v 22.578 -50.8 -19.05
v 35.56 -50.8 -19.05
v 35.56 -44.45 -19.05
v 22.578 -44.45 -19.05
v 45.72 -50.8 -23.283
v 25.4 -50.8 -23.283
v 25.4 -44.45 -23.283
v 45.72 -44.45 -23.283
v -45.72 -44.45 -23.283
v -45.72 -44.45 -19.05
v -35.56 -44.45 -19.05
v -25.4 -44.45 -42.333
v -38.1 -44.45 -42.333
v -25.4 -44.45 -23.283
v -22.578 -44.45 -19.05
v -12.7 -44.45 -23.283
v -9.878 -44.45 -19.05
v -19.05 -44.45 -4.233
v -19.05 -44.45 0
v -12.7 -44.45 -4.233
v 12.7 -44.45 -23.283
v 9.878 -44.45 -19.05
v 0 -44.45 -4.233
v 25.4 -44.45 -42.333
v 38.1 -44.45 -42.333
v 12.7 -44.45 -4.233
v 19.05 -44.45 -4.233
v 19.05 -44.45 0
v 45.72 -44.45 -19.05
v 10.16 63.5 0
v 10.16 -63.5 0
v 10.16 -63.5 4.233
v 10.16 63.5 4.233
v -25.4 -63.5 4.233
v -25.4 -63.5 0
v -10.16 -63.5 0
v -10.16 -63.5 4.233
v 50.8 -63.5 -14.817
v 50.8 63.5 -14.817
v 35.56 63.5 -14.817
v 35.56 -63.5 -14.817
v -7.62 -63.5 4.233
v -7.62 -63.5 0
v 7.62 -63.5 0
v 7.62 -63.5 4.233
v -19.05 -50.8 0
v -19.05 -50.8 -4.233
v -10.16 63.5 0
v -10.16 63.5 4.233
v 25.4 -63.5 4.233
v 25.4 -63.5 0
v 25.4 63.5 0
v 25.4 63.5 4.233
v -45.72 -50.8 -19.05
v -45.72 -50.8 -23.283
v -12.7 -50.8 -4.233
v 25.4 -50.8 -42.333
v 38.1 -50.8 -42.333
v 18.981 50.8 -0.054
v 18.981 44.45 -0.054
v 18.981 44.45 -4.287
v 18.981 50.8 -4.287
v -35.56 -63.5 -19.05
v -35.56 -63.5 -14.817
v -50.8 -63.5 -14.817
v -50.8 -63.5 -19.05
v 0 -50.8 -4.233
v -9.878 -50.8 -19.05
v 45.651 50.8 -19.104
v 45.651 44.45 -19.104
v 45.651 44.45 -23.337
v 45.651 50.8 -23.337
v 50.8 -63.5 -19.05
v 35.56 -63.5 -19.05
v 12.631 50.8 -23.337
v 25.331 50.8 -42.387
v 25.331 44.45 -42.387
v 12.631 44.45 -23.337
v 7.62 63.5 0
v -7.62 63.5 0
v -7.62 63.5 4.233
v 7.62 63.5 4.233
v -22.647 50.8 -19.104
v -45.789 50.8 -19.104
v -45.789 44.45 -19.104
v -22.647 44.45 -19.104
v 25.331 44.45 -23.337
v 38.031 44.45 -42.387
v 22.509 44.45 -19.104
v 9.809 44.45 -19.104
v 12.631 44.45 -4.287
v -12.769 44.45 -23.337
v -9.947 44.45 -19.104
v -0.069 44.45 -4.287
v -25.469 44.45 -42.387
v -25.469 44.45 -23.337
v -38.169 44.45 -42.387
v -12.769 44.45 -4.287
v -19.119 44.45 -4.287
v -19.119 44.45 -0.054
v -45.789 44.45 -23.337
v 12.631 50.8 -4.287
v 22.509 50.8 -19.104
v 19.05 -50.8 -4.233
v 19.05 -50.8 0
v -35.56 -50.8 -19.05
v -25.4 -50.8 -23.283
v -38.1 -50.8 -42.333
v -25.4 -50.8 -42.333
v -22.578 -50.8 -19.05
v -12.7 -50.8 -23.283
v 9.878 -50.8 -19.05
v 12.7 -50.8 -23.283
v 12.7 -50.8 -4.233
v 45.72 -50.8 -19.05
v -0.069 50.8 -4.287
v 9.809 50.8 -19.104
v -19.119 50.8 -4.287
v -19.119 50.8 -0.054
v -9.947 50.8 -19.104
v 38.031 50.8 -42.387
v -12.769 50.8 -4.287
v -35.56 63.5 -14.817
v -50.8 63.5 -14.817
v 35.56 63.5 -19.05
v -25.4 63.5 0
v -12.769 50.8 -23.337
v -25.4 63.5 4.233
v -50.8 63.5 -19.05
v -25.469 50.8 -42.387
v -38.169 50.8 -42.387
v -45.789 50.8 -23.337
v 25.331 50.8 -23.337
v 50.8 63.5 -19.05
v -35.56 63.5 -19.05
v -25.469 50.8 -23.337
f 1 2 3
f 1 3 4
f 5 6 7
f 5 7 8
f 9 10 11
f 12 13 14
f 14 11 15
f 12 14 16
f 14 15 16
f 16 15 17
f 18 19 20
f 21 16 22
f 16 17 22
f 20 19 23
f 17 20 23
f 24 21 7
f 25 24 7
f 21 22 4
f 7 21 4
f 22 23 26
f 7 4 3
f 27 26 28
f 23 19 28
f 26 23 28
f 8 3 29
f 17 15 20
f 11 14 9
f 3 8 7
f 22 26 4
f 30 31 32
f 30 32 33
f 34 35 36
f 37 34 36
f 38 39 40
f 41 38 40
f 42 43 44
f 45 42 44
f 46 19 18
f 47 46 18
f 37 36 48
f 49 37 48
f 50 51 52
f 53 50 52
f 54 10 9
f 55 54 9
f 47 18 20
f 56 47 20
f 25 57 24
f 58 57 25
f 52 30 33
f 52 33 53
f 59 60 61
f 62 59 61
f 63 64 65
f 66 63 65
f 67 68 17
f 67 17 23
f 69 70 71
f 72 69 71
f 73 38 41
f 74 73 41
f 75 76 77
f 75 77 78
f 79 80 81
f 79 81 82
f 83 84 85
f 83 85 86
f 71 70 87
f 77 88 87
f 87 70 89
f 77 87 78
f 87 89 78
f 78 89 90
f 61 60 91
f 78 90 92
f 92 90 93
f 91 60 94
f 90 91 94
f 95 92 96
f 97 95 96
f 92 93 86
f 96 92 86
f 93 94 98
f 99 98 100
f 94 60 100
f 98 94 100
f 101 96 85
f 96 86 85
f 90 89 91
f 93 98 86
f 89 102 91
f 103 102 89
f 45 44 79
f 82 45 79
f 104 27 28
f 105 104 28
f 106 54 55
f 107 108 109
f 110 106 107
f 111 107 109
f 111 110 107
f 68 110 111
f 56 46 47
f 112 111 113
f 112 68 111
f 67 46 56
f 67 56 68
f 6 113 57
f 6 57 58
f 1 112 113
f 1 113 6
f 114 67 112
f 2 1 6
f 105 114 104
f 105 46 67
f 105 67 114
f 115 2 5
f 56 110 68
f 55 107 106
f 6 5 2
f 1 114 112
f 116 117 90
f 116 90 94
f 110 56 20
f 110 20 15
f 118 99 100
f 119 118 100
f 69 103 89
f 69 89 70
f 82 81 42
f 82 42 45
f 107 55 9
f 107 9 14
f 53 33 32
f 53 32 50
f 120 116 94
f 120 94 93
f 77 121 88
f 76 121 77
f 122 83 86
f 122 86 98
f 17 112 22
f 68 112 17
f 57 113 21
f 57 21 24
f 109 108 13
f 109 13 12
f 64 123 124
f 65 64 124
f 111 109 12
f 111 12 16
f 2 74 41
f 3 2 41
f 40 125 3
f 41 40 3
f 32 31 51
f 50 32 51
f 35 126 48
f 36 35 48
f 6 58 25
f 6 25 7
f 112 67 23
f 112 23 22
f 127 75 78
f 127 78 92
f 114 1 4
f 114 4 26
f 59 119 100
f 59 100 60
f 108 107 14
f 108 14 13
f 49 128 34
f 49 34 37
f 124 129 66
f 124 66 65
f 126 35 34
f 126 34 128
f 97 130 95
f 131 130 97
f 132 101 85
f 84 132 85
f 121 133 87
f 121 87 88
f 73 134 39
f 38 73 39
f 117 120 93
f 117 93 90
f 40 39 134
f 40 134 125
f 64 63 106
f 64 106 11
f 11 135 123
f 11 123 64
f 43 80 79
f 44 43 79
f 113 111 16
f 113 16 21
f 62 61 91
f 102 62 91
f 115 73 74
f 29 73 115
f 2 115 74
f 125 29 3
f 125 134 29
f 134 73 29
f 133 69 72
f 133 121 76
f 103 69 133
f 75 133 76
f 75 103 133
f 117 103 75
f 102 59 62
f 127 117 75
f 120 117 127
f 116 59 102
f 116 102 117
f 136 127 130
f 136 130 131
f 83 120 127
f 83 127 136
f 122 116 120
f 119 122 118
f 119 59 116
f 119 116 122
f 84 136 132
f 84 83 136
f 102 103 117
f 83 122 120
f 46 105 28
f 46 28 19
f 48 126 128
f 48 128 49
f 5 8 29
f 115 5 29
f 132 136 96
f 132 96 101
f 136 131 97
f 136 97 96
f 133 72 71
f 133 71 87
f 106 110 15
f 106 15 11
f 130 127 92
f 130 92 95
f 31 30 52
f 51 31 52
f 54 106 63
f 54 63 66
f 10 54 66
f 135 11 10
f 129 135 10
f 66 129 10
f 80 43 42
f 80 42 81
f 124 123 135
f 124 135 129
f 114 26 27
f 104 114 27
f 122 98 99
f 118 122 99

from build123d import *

# Parameters (mm, degrees)
F0_W      = 15.24
F0_H      = 127
F1_DEPTH  = 4.2333333333
F4_DEPTH  = 6.35
F7_DEPTH  = 6.35
F9_W      = 15.24
F9_H      = 4.2333333333
F10_DEPTH = 127


with BuildPart() as f1:
    # F0 (on Top) → F1 (new body)
    with BuildSketch(Plane.XY):
        with Locations((-17.78, 0)):
            Rectangle(F0_W, F0_H)
    extrude(amount=F1_DEPTH)


with BuildPart() as f1b:
    # F0 (on Top) → F1, piece 2 (new body)
    with BuildSketch(Plane.XY):
        with Locations((17.78, 0)):
            Rectangle(F0_W, F0_H)
    extrude(amount=F1_DEPTH)


with BuildPart() as f1c:
    # F0 (on Top) → F1, piece 3 (new body)
    with BuildSketch(Plane.XY):
        Rectangle(F0_W, F0_H)
    extrude(amount=F1_DEPTH)


with BuildPart() as f4:
    # F3 (on offset) → F4 (new body)
    with BuildSketch(Plane.XZ.offset(50.8)):
        Polygon((19.05, 0), (-19.05, 0), (-19.05, -4.2333333333), (-12.7, -4.2333333333), (-22.5777777778, -19.05), (-45.71999982, -19.05), (-45.71999982, -23.2833333333), (-38.1, -23.2833333333), (-25.4, -23.2833333333), (-38.1, -42.3333333333), (-25.4, -42.3333333333), (-12.7, -23.2833333333), (12.7, -23.2833333333), (25.4, -42.3333333333), (38.1, -42.3333333333), (25.4, -23.2833333333), (38.1, -23.2833333333), (45.72, -23.2833333333), (45.72, -19.05), (22.5777777778, -19.05), (12.7, -4.2333333333), (19.05, -4.2333333333), align=None)
        Polygon((0, -4.2333333333), (9.8777777778, -19.05), (-9.8777777778, -19.05), align=None, mode=Mode.SUBTRACT)
    extrude(amount=-F4_DEPTH)

    # F9 (on offset) → F10 (join)
    with BuildSketch(Plane(origin=(0, 63.5, 0), x_dir=(-1, 0, 0), z_dir=(0, 1, 0))):
        with Locations((43.18, -16.9333333333)):
            Rectangle(F9_W, F9_H)
        with Locations((-43.18, -16.9333333333)):
            Rectangle(F9_W, F9_H)
    extrude(amount=-F10_DEPTH)


with BuildPart() as f7:
    # F6 (on offset) → F7 (new body)
    with BuildSketch(Plane(origin=(0, 50.8, 0), x_dir=(-1, 0, 0), z_dir=(0, 1, 0))):
        Polygon((19.1192216953, -0.0536813261), (-18.9807783047, -0.0536813261), (-18.9807783047, -4.2870146595), (-12.6307783047, -4.2870146595), (-22.5085560824, -19.1036813261), (-45.6507781246, -19.1036813261), (-45.6507781246, -23.3370146595), (-37.8464236413, -23.3370146595), (-25.3307783047, -23.3370146595), (-38.0307783047, -42.3870146595), (-25.3307783047, -42.3870146595), (-12.6307783047, -23.3370146595), (12.7692216953, -23.3370146595), (25.4692216953, -42.3870146595), (38.1692216953, -42.3870146595), (25.4692216953, -23.3370146595), (38.3535763587, -23.3370146595), (45.7892216953, -23.3370146595), (45.7892216953, -19.1036813261), (22.6469994731, -19.1036813261), (12.7692216953, -4.2870146595), (19.1192216953, -4.2870146595), align=None)
        Polygon((0.0692216953, -4.2870146595), (9.9469994731, -19.1036813261), (-9.8085560824, -19.1036813261), align=None, mode=Mode.SUBTRACT)
    extrude(amount=-F7_DEPTH)


solid = Compound([f1.part, f1b.part, f1c.part, f4.part, f7.part])
